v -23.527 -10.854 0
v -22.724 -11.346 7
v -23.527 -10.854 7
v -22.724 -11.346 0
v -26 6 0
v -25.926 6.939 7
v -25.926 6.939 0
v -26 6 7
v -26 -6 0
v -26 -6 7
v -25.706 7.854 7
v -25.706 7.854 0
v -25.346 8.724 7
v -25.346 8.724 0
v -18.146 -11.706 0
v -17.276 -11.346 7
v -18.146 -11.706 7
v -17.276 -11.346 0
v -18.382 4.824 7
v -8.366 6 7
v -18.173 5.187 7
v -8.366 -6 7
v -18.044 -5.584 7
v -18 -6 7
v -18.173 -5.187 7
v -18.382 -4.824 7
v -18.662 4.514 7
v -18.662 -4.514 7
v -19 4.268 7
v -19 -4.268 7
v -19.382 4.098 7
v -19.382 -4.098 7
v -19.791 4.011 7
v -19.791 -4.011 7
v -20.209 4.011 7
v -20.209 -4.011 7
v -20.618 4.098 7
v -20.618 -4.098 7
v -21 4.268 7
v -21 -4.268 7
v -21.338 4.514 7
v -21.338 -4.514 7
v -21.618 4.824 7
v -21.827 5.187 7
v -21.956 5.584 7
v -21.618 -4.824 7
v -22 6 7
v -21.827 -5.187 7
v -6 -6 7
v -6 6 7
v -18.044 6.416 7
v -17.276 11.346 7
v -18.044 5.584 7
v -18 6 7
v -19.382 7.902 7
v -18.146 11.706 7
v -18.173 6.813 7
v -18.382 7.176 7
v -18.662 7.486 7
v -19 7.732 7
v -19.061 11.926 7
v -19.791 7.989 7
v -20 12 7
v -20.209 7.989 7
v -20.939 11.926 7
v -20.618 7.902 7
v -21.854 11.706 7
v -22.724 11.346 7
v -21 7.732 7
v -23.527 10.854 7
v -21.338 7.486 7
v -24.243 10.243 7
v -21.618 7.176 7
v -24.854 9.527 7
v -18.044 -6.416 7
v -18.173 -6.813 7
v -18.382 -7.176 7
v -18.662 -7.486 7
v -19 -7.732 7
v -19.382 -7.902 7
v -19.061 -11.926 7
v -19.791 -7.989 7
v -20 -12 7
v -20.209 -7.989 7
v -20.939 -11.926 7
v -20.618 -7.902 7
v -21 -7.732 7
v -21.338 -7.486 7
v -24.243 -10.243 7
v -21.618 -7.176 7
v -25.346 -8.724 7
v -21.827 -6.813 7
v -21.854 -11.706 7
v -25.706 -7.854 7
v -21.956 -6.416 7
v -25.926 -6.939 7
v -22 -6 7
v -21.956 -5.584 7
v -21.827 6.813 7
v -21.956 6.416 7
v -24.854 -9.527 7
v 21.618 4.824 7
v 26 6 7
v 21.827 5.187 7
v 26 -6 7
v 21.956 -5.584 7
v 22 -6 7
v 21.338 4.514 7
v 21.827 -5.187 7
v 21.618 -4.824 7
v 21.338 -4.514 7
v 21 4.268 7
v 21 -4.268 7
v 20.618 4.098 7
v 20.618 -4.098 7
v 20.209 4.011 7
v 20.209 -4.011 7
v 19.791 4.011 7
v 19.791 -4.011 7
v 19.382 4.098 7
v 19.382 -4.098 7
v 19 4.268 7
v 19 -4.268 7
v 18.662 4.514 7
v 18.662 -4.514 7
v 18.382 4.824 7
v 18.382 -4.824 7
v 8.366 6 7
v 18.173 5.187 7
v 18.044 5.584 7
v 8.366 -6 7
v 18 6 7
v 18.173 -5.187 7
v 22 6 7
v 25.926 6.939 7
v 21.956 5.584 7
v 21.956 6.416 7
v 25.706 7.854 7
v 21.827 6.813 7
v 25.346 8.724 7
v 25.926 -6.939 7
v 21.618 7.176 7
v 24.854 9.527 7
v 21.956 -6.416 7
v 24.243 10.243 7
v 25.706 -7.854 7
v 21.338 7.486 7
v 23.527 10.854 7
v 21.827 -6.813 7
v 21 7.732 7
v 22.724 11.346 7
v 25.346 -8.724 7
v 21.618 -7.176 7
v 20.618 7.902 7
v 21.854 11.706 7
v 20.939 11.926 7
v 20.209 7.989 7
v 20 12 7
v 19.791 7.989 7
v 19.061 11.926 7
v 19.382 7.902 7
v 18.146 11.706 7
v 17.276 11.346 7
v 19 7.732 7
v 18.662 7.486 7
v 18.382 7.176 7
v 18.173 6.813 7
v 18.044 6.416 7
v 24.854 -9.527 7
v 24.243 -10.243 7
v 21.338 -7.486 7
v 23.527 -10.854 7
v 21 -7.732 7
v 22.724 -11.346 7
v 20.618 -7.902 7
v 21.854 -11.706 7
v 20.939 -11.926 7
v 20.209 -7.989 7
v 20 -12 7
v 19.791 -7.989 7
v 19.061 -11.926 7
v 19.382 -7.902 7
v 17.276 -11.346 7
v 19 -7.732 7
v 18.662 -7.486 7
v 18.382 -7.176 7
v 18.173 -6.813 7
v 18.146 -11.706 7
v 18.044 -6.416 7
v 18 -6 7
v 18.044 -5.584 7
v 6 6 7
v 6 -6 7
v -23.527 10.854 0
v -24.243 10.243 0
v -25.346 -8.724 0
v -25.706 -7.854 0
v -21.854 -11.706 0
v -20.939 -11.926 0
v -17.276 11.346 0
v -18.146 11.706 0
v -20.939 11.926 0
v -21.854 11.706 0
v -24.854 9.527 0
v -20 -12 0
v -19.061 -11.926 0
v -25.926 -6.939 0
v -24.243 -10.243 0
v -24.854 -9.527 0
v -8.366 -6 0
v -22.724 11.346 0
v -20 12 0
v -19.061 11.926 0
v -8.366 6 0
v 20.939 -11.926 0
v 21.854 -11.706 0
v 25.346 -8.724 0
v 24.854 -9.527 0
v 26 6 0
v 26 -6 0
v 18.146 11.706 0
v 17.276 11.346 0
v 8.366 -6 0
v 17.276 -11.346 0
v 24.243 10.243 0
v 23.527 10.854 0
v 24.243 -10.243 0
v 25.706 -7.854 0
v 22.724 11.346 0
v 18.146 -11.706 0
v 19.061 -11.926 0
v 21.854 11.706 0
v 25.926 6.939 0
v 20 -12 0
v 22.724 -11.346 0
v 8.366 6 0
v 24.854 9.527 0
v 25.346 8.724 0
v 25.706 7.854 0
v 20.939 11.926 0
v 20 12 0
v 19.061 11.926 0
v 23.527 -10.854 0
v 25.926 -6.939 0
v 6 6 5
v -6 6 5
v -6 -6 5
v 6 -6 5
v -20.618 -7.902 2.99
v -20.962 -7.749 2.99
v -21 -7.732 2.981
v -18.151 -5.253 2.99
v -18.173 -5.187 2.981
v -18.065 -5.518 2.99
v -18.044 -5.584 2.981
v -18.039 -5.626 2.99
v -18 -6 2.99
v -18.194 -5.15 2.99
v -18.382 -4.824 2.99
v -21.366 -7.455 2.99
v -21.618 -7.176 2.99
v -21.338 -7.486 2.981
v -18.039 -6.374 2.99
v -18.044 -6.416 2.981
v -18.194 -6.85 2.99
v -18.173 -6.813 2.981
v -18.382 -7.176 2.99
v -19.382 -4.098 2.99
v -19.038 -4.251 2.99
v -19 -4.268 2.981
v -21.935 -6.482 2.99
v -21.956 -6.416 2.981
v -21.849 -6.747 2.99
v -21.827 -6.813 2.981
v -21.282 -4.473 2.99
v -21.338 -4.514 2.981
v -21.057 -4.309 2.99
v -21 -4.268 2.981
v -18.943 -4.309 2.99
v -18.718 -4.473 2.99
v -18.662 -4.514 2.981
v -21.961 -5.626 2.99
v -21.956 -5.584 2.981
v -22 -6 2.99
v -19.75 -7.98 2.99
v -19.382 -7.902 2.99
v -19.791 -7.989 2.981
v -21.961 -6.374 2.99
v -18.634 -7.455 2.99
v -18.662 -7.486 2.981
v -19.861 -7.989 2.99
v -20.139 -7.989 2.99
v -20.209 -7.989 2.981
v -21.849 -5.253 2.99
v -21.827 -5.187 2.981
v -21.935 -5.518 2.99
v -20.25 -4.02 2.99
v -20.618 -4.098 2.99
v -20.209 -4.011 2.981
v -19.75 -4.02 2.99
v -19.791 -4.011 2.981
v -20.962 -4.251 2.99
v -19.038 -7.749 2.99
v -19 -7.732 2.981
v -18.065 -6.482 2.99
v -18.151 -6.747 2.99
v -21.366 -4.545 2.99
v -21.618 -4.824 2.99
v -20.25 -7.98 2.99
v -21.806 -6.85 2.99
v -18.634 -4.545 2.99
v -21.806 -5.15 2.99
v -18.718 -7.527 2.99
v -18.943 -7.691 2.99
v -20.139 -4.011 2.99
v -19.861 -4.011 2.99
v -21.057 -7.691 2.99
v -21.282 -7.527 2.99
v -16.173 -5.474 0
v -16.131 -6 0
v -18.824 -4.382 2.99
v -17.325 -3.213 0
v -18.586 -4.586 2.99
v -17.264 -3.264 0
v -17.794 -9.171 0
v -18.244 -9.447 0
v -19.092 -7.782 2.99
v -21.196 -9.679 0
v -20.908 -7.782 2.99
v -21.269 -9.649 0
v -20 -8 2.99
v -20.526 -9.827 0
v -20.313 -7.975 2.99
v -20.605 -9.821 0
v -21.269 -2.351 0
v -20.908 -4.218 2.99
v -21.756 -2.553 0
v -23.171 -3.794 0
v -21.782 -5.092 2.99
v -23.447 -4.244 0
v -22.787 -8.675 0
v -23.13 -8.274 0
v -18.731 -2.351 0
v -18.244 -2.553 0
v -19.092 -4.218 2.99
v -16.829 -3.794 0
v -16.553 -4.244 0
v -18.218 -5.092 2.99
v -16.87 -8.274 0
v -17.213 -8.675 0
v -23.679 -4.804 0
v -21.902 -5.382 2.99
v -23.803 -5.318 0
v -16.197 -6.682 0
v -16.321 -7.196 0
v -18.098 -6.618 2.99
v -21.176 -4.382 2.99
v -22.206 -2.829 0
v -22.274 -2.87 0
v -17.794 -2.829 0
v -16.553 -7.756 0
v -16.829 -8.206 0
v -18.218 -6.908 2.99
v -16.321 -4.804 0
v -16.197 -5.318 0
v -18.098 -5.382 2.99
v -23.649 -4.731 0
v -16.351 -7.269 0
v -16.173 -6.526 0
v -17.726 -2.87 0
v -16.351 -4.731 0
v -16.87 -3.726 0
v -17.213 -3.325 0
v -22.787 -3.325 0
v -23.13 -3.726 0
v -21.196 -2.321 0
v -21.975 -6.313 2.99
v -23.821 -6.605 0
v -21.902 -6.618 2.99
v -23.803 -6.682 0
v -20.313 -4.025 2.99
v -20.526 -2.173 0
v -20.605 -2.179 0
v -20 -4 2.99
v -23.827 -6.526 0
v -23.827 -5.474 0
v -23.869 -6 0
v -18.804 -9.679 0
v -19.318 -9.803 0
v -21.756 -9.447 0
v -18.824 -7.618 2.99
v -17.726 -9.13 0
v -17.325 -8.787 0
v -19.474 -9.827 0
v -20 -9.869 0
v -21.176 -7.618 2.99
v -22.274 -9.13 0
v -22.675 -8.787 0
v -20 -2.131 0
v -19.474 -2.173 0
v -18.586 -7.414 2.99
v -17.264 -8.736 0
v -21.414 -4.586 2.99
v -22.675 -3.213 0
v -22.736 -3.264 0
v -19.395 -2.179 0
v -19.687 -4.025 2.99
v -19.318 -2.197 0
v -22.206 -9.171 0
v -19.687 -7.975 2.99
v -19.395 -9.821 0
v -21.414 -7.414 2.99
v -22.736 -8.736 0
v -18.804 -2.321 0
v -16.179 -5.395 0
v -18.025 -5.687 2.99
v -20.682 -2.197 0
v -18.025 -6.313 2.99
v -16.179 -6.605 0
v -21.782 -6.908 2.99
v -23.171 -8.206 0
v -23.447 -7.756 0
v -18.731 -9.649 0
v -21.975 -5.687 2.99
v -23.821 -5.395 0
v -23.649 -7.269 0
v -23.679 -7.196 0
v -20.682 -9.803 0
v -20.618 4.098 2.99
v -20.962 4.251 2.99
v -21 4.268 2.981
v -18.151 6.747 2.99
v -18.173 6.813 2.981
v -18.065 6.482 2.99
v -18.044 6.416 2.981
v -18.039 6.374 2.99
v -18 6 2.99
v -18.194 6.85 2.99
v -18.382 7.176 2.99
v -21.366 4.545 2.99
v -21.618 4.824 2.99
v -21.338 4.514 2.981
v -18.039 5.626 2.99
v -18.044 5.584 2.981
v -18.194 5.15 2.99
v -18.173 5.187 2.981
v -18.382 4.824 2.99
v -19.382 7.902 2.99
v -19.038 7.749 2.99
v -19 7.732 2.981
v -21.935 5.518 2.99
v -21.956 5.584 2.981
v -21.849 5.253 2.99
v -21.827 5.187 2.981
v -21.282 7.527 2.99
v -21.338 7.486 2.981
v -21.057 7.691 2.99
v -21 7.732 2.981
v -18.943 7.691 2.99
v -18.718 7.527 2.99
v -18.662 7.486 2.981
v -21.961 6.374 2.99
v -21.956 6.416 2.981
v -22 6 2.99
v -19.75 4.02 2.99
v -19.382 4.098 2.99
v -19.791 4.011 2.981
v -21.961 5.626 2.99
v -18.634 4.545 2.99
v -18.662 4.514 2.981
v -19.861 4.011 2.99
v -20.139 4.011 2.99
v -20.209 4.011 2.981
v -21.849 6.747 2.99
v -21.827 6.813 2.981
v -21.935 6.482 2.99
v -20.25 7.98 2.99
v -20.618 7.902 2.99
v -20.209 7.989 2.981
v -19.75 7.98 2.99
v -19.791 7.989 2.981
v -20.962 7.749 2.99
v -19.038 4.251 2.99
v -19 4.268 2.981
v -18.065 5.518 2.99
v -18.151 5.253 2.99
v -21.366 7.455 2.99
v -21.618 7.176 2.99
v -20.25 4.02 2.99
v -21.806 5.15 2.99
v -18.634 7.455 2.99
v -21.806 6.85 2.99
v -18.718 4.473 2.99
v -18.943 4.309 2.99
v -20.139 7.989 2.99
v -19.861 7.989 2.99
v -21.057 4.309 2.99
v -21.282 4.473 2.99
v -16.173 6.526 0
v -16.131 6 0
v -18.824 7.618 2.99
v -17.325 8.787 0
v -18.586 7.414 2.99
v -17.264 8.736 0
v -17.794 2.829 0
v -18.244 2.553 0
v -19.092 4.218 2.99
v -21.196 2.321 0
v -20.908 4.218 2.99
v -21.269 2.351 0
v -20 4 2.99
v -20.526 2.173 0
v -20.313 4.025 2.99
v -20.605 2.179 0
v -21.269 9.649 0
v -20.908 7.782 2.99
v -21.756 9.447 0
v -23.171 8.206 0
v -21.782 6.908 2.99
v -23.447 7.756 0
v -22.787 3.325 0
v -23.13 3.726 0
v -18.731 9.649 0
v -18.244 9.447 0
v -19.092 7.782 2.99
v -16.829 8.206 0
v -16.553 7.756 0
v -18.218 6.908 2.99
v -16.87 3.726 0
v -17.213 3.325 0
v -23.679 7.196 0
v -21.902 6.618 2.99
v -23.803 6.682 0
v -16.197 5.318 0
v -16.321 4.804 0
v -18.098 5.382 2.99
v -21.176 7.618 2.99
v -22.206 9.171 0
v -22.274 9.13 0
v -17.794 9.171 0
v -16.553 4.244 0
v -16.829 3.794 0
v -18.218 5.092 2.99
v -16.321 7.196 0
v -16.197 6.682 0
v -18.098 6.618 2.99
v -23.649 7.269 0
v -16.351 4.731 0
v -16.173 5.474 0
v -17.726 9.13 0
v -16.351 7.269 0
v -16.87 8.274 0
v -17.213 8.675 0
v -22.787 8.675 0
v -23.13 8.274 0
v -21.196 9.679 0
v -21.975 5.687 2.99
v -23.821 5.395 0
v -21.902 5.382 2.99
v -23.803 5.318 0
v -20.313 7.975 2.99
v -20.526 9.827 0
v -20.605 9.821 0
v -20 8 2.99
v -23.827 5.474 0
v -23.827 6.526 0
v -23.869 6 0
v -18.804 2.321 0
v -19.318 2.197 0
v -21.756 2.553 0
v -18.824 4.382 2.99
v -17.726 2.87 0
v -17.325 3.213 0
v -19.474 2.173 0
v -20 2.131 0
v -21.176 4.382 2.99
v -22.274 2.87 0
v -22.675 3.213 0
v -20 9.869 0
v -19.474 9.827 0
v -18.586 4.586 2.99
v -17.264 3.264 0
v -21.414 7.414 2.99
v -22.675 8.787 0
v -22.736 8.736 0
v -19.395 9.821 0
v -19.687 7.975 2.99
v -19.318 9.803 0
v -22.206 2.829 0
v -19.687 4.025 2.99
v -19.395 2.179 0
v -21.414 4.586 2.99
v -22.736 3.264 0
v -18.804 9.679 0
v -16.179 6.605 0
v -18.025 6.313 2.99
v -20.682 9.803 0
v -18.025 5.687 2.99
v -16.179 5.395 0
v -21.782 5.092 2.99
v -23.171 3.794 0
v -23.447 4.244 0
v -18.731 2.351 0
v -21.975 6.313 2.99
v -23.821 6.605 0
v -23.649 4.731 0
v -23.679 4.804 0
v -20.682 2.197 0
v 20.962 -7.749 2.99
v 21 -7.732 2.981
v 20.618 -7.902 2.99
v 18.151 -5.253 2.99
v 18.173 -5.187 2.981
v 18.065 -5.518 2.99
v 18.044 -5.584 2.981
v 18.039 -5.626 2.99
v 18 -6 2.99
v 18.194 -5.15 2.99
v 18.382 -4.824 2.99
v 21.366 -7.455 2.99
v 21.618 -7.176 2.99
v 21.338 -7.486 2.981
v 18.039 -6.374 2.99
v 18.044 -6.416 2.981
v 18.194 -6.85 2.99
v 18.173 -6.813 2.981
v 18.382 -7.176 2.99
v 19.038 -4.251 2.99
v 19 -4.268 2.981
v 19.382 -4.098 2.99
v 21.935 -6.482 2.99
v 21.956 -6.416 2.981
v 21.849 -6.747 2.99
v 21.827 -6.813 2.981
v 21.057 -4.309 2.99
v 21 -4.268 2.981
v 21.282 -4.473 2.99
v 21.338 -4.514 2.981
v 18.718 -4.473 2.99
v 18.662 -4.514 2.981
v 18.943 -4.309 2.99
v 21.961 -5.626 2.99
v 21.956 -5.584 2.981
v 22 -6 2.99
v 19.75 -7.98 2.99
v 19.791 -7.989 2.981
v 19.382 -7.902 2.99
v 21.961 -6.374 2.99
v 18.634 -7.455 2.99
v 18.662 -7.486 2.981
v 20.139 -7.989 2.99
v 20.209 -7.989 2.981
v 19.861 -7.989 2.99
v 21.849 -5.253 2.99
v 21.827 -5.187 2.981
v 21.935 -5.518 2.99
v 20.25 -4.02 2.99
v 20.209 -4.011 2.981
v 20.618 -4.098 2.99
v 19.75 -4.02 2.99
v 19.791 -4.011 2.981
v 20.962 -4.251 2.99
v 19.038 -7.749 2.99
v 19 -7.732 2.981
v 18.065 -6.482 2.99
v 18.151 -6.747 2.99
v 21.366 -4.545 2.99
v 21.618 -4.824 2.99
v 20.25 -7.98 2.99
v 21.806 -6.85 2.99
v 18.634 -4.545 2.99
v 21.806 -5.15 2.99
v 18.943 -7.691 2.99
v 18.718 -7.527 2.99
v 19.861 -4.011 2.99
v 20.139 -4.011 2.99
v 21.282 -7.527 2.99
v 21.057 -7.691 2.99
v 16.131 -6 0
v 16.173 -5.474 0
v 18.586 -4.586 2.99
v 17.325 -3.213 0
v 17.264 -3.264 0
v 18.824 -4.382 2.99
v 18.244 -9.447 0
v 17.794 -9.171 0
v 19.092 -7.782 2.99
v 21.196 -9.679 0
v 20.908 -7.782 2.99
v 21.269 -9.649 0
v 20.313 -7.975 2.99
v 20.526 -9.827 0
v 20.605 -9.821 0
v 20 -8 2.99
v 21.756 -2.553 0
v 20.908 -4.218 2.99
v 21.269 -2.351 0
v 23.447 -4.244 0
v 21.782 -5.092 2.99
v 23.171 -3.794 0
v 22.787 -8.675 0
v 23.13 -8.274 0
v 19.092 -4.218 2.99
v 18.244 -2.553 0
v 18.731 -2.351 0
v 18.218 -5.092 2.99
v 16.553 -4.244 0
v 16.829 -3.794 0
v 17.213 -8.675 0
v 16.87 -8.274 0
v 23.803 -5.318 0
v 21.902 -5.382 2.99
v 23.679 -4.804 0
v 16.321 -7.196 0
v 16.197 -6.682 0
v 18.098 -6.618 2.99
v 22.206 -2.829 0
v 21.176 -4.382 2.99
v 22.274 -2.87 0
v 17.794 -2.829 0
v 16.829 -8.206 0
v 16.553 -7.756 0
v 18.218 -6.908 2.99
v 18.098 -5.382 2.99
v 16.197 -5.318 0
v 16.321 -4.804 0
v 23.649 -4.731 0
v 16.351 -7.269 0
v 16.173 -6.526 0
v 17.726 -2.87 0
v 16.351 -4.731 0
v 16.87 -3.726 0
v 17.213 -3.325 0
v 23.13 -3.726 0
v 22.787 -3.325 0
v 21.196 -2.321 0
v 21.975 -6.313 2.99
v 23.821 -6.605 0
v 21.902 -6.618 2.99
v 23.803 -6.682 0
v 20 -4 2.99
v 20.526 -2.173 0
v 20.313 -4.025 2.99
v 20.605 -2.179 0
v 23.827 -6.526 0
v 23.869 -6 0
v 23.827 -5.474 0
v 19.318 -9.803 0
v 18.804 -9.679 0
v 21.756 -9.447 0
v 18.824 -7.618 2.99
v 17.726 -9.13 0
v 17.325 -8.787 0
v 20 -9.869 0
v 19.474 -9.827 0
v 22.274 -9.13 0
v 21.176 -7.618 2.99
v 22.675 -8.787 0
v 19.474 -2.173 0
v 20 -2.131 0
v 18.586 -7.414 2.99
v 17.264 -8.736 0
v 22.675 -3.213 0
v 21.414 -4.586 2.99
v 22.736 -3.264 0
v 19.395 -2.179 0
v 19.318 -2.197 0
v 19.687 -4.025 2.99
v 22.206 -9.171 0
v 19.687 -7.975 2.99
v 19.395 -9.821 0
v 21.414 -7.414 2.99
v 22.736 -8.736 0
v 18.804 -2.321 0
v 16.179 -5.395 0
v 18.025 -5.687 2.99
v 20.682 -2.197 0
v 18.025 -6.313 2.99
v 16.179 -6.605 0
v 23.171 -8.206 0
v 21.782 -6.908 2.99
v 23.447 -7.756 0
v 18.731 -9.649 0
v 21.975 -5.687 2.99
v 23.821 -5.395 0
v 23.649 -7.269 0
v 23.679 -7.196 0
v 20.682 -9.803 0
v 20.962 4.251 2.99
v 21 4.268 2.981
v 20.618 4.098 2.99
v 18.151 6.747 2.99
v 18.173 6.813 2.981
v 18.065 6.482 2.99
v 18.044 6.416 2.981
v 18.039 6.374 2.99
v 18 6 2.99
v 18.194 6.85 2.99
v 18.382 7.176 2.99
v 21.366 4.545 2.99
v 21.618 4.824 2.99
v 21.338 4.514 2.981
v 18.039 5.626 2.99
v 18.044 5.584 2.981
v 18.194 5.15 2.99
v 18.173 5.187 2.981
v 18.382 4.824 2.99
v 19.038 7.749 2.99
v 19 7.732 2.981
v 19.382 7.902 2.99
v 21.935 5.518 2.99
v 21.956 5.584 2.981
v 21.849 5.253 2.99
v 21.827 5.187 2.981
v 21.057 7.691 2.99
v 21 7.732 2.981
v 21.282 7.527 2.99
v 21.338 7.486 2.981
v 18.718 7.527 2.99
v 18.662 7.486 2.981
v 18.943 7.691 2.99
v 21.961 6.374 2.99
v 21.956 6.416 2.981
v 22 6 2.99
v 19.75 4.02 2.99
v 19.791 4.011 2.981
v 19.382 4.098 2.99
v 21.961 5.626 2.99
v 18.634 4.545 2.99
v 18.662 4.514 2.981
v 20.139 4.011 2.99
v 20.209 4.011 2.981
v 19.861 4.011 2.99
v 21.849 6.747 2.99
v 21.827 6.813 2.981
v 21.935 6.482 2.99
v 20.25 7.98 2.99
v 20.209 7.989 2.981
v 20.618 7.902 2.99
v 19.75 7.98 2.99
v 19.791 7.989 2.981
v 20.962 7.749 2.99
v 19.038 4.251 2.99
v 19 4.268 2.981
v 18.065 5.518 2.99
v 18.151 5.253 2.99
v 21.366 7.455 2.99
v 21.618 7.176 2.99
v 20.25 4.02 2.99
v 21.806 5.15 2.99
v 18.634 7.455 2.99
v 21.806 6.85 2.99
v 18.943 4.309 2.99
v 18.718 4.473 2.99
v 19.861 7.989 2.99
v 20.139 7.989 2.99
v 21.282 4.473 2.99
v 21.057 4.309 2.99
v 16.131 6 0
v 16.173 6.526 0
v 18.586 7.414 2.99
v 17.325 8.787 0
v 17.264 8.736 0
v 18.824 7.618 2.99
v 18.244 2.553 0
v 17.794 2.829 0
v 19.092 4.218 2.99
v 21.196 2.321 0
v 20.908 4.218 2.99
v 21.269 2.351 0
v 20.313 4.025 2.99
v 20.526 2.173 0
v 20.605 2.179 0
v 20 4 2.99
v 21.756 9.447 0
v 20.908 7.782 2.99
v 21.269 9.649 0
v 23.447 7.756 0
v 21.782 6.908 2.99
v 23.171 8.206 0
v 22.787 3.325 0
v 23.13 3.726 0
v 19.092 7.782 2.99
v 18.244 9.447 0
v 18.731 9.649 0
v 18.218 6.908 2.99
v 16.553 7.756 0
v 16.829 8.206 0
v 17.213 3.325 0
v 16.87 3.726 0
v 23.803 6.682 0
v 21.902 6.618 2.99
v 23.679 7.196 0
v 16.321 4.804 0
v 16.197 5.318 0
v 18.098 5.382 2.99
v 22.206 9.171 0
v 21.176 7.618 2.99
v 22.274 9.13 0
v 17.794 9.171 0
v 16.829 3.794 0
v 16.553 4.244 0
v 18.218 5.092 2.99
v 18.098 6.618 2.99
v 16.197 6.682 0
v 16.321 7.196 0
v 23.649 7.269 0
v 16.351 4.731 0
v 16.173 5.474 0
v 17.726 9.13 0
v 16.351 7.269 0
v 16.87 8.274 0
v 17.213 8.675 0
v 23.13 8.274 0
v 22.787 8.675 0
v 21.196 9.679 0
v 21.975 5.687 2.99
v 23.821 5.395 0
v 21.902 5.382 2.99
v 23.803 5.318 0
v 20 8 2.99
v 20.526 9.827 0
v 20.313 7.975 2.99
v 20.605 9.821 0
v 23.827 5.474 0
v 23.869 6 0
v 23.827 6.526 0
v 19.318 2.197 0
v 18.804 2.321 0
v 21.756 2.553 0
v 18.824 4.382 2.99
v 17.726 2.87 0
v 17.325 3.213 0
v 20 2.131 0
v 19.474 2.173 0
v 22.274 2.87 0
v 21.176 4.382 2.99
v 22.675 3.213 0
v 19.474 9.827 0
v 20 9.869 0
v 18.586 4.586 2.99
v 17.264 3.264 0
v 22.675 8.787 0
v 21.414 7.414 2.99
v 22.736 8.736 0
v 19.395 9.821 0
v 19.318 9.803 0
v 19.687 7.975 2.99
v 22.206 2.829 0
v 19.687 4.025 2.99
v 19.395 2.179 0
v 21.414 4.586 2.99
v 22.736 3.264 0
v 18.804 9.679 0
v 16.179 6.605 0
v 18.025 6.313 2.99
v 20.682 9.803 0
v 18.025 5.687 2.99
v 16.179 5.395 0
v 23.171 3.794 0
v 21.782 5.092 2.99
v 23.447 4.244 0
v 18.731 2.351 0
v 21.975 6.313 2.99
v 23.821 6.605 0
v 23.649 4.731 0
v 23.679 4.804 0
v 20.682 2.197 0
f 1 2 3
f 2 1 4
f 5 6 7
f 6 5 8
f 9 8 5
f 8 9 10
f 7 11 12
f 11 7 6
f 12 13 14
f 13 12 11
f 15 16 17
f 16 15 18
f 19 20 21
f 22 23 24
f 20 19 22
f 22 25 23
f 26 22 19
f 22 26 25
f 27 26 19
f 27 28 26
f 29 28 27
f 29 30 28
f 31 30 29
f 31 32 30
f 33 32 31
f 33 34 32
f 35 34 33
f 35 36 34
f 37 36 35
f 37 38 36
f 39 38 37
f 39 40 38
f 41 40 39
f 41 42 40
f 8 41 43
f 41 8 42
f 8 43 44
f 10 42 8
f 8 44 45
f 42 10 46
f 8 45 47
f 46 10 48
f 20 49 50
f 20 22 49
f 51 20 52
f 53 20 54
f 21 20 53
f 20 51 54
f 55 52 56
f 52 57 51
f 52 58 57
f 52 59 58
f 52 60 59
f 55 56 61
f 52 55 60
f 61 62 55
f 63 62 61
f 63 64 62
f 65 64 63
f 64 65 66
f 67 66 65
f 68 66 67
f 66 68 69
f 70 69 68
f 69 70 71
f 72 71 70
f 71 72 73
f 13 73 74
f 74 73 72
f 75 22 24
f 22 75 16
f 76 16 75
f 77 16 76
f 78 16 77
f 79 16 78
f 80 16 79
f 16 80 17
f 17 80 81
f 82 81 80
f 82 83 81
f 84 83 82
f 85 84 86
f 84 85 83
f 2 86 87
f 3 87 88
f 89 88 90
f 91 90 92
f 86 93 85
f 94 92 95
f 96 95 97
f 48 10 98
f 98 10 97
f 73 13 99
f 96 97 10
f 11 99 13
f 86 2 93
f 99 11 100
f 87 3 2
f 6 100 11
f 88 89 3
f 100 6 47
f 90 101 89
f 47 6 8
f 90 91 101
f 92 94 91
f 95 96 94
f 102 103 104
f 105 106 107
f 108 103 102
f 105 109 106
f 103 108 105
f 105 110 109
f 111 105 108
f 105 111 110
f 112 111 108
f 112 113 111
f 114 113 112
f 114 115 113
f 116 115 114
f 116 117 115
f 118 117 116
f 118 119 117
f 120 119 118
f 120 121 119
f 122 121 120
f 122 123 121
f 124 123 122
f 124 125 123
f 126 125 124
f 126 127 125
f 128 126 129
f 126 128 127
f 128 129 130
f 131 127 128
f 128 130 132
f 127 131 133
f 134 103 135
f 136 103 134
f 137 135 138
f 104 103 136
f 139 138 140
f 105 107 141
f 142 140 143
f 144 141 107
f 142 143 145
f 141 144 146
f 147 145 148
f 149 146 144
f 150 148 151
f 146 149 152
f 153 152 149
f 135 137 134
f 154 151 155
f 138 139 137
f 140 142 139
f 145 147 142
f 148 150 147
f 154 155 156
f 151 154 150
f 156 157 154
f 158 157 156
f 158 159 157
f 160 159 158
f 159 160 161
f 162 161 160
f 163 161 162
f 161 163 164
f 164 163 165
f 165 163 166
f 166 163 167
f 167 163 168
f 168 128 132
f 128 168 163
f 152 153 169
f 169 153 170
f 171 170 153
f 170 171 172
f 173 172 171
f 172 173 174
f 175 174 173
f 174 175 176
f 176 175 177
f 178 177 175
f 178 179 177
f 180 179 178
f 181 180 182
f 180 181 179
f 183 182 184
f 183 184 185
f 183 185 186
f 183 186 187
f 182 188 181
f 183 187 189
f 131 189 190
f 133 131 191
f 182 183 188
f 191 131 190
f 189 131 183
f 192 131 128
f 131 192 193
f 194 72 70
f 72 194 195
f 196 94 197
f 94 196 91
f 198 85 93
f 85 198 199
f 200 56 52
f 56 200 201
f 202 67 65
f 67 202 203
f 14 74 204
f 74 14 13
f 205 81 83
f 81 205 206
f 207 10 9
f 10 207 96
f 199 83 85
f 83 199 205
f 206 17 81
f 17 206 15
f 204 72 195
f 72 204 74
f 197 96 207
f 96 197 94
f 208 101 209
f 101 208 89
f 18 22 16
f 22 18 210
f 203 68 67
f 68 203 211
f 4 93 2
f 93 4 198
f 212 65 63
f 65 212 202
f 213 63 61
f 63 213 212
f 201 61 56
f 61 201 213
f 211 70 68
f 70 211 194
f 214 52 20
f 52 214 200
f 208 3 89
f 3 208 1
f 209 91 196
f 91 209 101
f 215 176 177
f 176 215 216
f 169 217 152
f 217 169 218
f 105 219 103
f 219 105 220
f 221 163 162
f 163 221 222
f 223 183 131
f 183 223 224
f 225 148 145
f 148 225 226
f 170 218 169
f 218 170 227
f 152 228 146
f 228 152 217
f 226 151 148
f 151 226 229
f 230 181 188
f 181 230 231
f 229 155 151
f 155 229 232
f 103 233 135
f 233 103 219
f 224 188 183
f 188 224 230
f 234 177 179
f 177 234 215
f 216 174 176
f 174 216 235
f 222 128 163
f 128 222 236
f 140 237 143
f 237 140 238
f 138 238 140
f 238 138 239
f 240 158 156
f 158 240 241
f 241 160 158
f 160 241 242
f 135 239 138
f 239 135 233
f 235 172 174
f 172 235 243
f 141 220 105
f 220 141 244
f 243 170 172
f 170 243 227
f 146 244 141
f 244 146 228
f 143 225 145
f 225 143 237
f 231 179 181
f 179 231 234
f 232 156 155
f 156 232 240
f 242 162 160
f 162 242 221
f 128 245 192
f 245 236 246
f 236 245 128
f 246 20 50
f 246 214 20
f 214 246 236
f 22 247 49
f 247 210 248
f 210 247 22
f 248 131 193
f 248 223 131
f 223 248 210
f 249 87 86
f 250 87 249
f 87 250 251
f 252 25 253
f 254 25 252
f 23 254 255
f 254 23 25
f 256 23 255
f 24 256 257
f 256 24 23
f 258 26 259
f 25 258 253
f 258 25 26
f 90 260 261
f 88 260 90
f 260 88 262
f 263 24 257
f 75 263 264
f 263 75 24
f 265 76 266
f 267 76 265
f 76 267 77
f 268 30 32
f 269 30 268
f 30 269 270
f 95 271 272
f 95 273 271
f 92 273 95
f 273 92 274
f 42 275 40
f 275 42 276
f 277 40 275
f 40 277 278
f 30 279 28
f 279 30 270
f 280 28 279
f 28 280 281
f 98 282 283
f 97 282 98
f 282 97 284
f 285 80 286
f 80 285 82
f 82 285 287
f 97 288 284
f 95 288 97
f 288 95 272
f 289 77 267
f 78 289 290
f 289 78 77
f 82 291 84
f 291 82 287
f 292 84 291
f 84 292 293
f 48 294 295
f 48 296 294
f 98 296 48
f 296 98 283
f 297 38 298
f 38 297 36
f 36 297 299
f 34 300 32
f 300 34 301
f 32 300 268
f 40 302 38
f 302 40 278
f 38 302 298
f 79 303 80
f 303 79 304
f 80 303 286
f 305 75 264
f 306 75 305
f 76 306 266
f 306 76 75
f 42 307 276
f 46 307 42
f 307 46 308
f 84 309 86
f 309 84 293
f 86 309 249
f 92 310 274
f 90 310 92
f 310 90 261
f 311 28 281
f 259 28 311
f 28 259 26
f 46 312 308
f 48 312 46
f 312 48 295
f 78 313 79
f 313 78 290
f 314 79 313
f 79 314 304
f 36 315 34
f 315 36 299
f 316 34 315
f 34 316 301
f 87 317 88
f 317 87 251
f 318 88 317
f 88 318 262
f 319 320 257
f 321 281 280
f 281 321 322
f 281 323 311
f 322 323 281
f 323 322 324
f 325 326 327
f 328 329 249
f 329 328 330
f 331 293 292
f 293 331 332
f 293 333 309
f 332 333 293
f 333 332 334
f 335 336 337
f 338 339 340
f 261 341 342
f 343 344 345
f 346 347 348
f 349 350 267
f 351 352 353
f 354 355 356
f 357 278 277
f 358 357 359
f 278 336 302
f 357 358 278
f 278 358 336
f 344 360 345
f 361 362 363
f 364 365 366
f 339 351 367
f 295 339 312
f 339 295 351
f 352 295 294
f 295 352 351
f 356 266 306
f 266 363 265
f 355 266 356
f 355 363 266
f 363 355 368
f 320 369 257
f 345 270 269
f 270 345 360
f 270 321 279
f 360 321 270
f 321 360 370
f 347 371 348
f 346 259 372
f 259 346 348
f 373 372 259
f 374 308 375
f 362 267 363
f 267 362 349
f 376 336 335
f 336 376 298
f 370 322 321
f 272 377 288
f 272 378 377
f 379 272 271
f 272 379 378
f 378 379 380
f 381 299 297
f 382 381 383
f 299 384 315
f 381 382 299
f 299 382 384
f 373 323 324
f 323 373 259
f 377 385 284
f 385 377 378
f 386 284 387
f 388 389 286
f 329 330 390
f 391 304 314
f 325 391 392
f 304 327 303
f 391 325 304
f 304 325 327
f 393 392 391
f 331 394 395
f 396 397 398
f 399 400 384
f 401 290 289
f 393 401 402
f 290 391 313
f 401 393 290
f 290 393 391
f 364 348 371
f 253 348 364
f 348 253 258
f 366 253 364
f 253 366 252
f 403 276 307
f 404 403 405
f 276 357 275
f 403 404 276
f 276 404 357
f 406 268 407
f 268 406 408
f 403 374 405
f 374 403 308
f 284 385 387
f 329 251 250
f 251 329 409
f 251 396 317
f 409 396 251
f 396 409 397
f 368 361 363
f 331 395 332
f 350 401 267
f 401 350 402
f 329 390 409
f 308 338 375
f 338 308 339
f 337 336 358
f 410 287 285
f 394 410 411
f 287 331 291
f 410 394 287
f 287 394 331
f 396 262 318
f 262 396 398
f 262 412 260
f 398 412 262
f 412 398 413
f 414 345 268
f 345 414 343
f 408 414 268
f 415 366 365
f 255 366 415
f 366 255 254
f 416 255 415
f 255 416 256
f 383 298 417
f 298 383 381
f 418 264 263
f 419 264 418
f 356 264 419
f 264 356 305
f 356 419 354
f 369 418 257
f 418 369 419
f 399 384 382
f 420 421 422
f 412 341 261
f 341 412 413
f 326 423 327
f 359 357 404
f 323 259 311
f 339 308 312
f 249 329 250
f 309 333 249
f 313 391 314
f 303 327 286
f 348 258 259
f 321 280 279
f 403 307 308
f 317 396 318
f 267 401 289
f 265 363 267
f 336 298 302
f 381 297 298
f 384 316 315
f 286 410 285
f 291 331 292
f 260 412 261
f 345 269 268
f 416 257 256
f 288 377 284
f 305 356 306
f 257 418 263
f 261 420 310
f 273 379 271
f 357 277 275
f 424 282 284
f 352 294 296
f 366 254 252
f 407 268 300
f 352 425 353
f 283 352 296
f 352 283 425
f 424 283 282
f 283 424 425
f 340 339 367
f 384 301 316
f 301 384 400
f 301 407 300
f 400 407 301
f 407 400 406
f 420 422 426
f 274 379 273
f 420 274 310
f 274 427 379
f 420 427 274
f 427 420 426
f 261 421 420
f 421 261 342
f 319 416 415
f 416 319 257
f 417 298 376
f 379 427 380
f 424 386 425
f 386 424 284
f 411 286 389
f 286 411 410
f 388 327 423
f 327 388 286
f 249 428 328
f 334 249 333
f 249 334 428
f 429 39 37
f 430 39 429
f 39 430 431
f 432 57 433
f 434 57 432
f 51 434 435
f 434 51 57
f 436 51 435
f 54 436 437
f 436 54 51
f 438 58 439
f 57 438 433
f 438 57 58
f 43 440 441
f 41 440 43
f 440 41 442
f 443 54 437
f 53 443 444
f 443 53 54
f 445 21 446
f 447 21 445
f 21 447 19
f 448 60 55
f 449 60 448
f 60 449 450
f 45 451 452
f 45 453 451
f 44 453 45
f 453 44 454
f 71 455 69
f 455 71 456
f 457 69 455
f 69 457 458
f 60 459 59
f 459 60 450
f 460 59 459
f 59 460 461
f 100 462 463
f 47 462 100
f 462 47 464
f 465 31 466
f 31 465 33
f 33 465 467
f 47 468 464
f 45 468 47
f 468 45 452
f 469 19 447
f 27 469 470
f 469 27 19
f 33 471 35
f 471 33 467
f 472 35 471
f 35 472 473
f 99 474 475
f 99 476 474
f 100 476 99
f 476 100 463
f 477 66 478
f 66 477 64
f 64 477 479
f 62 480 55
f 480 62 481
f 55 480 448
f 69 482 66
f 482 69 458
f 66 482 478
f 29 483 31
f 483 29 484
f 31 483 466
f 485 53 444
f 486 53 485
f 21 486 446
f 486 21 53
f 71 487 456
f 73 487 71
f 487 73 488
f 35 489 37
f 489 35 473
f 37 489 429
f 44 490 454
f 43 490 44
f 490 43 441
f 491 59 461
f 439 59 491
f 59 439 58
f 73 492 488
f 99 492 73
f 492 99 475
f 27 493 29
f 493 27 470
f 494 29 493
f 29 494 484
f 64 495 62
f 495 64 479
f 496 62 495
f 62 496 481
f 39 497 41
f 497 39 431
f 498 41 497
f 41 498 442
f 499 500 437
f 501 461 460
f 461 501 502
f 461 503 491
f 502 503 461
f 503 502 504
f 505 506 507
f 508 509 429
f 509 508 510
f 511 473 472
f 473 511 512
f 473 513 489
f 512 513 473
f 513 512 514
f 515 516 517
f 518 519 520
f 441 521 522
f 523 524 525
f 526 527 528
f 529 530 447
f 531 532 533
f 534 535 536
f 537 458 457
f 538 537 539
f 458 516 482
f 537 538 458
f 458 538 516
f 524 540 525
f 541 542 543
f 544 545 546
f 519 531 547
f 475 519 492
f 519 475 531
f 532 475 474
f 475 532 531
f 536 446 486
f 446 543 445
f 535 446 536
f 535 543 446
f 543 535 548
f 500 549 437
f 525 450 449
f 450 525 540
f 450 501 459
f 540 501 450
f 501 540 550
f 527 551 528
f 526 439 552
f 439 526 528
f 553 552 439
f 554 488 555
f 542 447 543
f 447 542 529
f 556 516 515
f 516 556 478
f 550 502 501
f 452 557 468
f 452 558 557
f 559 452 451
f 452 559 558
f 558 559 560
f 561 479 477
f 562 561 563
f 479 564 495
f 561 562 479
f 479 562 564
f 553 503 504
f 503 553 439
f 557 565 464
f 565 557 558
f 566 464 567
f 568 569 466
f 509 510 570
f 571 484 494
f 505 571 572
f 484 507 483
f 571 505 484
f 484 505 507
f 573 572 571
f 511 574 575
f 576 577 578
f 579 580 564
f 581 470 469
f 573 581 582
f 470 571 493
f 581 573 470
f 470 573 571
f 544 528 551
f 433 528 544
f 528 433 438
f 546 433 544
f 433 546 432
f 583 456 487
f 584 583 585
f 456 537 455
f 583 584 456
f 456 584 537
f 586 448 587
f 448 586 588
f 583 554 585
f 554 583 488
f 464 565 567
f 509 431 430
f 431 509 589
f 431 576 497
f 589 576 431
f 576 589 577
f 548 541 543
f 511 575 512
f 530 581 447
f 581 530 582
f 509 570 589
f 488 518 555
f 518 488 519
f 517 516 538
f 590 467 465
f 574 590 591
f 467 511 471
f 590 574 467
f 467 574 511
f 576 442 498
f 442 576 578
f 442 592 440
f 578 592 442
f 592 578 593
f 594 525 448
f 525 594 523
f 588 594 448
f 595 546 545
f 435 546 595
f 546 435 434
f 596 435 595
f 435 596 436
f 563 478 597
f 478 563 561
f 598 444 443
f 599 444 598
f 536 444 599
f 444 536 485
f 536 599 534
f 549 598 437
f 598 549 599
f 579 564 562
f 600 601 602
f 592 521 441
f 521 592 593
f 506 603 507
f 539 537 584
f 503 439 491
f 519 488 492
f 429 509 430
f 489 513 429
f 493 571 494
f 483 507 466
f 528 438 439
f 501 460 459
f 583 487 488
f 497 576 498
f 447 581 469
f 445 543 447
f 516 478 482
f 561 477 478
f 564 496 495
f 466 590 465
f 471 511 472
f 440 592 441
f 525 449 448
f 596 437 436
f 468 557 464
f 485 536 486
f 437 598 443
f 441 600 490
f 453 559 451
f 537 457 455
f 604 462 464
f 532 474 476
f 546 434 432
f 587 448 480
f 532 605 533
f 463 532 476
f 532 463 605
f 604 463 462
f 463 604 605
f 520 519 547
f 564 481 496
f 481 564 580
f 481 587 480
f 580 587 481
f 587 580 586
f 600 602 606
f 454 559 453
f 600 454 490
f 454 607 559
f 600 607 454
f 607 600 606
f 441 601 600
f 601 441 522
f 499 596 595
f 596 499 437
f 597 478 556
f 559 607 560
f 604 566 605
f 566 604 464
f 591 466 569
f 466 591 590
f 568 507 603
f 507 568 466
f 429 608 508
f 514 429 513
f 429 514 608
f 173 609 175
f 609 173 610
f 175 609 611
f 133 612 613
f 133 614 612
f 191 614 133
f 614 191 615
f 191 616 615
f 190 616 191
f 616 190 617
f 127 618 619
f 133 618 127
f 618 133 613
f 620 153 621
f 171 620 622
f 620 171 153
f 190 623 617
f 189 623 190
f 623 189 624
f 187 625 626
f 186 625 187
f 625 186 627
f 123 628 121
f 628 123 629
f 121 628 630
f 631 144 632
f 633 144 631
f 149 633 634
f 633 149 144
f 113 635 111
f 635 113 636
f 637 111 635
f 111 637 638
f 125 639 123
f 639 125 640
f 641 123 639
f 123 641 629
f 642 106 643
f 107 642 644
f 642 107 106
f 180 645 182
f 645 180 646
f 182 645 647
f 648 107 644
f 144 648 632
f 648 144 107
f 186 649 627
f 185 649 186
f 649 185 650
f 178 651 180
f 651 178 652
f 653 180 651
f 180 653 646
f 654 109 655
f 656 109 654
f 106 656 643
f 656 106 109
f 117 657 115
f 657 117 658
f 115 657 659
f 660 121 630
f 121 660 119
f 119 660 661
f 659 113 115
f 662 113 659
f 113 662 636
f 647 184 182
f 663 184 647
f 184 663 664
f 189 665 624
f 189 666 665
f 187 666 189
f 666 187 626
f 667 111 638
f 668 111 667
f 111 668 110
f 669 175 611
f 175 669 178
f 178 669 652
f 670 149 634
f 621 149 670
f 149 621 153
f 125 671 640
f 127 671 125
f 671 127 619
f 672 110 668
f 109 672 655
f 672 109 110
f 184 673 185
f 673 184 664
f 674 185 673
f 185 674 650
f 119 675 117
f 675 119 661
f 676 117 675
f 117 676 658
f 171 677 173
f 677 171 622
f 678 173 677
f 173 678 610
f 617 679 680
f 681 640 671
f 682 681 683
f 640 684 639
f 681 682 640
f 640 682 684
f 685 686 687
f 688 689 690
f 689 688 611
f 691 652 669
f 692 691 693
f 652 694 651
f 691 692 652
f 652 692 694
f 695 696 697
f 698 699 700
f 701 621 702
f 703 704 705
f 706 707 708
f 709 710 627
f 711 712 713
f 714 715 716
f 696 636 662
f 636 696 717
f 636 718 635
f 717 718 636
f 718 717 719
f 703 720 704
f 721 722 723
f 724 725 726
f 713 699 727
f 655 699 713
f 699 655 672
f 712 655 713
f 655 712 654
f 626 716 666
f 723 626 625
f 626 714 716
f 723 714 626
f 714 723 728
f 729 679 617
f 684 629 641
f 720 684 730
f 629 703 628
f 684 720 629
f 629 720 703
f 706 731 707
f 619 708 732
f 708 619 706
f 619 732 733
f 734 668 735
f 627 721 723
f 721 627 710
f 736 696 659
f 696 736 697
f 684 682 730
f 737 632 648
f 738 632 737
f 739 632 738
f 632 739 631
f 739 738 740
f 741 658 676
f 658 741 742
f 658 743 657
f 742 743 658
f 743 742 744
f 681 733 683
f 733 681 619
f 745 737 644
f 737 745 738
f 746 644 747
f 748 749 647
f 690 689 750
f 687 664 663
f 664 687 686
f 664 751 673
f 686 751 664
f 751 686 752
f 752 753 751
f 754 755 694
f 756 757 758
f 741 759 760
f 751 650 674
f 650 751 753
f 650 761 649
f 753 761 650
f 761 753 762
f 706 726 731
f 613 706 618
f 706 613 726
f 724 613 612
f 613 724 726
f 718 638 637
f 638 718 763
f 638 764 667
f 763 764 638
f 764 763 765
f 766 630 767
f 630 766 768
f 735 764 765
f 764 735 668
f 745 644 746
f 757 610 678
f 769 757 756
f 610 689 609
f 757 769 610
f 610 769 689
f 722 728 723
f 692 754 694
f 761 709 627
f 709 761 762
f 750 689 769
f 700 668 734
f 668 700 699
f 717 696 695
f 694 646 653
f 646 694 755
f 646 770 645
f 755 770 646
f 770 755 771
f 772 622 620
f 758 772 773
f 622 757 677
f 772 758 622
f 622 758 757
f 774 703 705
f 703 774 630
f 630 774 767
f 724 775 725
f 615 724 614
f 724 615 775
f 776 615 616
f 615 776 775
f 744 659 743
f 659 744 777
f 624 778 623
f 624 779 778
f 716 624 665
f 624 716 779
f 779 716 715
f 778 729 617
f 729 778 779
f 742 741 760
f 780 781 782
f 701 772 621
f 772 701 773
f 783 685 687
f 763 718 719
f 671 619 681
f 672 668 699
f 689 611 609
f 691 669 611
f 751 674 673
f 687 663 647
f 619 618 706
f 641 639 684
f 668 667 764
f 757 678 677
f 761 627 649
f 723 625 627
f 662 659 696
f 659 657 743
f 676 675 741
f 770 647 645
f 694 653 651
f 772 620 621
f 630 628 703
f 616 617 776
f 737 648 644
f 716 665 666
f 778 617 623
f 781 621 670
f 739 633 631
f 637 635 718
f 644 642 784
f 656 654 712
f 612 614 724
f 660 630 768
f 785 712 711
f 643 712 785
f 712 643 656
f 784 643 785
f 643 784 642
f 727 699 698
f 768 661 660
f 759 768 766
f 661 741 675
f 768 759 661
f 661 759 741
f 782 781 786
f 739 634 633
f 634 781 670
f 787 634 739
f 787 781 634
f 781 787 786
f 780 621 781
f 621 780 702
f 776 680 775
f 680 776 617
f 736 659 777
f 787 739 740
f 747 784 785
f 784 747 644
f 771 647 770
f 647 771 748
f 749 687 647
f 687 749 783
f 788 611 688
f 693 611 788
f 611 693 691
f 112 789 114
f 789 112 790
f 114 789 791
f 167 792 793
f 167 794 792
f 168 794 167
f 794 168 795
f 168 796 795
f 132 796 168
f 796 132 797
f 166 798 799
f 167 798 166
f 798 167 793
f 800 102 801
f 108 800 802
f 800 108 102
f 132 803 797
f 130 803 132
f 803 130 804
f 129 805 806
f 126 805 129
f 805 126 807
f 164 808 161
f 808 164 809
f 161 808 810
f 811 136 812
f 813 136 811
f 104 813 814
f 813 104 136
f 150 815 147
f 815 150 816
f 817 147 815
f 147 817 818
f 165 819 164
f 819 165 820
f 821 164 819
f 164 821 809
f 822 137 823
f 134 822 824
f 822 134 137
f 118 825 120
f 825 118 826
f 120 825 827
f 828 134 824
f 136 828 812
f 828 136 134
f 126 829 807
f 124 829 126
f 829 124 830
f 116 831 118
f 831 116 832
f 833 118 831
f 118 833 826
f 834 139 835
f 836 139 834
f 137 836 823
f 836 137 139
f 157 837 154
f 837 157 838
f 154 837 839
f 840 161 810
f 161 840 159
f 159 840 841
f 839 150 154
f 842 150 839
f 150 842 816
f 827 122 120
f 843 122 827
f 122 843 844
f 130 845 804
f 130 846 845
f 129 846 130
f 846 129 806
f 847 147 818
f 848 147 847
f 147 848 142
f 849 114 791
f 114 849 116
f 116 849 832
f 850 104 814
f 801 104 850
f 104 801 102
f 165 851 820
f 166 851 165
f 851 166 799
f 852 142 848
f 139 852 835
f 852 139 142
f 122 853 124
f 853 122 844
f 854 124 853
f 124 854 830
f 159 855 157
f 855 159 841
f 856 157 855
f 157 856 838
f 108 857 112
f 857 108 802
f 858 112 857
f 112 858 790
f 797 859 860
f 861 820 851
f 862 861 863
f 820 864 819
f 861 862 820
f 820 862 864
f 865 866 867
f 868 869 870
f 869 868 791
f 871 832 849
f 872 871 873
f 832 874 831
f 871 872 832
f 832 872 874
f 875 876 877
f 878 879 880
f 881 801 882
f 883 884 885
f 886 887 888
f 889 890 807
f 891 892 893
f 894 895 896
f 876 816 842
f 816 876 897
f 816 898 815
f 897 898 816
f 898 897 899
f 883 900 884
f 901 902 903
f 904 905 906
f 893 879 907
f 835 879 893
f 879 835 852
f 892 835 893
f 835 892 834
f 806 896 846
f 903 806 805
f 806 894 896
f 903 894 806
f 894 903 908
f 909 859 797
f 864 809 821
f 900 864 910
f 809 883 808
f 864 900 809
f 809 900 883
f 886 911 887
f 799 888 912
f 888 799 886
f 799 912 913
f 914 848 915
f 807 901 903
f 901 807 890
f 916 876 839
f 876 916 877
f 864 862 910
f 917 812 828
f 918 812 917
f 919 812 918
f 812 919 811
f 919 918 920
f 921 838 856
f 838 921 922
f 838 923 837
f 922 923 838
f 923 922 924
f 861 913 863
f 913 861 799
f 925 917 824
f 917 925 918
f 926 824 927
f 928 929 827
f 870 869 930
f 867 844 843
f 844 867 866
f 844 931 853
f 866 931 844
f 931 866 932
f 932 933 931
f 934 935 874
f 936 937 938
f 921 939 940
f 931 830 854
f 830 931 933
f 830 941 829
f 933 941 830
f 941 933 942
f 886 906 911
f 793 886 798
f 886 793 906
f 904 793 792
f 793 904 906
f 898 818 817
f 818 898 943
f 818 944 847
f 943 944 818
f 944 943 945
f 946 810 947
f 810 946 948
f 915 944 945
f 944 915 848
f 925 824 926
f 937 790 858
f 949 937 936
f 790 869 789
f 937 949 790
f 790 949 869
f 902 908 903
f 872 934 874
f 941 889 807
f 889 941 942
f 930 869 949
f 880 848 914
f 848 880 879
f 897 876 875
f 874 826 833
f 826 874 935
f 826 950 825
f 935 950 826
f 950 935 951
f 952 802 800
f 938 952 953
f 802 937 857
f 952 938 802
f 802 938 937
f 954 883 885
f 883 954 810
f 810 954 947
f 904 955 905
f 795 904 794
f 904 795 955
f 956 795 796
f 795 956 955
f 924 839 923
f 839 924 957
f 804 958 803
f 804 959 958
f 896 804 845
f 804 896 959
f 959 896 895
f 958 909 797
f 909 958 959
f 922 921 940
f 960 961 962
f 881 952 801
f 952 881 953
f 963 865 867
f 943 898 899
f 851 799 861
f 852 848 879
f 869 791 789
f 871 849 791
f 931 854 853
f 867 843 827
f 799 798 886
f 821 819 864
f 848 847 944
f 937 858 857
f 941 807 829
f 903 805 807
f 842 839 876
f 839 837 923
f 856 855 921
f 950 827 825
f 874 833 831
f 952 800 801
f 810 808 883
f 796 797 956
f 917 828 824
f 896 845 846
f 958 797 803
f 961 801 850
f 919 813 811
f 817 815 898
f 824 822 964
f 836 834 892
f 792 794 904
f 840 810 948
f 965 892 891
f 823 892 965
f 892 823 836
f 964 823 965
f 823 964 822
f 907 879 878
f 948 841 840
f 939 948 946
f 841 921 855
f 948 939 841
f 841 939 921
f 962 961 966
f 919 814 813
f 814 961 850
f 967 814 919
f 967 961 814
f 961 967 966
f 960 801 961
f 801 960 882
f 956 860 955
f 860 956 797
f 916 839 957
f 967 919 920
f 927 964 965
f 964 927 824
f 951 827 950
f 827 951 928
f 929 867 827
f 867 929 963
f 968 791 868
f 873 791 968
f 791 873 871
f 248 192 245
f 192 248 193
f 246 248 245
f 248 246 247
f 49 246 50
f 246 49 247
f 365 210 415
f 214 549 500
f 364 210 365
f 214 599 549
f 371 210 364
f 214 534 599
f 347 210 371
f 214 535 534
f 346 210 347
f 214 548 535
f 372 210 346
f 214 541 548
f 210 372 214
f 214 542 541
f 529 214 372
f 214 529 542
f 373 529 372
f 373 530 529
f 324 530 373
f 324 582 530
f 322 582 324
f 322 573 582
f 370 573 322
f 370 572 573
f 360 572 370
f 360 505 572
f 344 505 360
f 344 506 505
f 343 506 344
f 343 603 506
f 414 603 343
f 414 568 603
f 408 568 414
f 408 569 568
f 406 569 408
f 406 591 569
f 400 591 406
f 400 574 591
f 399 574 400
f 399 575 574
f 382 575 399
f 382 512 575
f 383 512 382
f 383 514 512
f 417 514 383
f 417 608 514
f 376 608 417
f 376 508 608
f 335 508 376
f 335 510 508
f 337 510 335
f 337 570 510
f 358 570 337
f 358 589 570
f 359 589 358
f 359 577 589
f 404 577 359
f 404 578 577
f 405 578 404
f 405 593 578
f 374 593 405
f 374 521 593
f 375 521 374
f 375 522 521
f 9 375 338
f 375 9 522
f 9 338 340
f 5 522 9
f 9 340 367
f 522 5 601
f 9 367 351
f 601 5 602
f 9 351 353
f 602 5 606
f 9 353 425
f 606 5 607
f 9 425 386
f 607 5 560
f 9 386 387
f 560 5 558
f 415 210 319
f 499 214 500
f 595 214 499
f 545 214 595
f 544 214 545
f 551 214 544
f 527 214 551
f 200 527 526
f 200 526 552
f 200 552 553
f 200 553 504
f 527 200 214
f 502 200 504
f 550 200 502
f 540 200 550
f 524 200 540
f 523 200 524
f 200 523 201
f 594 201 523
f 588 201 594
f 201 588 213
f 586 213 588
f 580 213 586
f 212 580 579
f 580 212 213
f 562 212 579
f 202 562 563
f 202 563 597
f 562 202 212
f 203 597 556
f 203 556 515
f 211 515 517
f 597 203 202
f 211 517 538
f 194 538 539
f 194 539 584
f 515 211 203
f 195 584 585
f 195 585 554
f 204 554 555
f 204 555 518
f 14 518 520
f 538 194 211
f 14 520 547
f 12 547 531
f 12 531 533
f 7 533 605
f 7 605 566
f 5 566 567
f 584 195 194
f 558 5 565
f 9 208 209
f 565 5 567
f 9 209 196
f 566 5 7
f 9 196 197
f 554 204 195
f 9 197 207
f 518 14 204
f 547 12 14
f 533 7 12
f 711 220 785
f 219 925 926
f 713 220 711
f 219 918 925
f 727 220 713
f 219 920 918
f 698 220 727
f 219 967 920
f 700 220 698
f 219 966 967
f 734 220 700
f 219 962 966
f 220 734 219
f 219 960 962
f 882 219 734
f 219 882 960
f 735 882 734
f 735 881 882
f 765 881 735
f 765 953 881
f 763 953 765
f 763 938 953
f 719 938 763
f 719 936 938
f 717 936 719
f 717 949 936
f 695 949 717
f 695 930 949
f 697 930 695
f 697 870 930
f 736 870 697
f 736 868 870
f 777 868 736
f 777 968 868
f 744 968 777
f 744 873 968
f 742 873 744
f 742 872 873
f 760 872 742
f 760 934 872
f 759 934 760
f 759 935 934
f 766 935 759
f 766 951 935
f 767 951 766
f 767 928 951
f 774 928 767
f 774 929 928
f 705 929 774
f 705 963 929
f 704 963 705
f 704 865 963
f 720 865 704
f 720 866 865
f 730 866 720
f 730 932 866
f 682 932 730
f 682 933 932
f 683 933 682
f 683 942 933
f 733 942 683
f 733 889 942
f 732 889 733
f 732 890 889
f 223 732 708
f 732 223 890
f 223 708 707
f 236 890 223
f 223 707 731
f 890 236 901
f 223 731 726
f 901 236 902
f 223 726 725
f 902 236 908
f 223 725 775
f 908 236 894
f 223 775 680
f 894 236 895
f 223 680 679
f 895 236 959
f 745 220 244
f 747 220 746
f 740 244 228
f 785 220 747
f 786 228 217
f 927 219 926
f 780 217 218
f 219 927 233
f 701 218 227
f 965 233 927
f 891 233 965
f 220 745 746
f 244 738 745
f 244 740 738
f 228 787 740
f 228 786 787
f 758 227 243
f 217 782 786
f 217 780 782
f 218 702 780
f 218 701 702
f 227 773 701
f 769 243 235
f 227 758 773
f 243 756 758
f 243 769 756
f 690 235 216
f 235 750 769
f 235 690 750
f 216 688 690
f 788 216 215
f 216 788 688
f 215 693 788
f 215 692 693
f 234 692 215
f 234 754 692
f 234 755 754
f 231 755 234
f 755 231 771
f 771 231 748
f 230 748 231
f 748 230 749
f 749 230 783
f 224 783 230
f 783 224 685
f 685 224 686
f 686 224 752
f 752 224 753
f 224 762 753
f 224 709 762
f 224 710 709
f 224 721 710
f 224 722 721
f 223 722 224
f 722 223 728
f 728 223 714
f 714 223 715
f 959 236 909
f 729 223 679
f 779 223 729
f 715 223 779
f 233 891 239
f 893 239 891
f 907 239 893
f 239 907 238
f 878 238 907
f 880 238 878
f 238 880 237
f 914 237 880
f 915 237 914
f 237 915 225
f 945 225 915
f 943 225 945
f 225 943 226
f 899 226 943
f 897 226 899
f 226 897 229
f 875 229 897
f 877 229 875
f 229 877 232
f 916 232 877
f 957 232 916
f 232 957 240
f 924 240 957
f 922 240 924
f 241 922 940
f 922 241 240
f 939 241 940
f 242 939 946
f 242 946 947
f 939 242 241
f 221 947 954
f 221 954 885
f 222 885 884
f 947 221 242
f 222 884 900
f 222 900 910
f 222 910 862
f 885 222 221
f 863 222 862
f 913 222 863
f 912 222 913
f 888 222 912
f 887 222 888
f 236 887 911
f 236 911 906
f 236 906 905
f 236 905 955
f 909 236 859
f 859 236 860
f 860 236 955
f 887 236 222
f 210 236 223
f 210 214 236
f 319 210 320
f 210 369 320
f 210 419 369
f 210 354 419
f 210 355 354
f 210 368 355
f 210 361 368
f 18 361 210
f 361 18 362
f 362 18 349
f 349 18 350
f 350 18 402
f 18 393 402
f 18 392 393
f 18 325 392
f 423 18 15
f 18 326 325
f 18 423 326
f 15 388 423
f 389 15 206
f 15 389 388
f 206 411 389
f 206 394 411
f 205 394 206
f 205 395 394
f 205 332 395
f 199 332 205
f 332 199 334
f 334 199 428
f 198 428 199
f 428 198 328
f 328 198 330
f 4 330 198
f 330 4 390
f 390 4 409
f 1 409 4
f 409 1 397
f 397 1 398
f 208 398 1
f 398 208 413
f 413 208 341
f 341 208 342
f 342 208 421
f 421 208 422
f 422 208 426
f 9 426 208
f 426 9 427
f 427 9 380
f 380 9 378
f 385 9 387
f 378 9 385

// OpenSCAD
*!reinforce_box();
intersection(){
  translate([-50,-50,0]) cube([100,100,12]);
difference(){
  union(){
    translate([-24,-6,-5]) cube([48,12,12]);
    for(m=[0,1]) mirror([m,0])
    hull(){
      translate([-20,-6,-5]) cylinder(d=12,h=12,$fn=40);
      translate([-20,6,-5]) cylinder(d=12,h=12,$fn=40);
      translate([-10,0,-5]) cylinder(d=12,h=12,$fn=40);
    }
  }
  translate([-6,-6.01,5]) cube([12,12.02,4.02]);
  for(m=[0,1]) mirror([m,0]) {
    *translate([-10,0,-1.01]) screwhole();
    translate([-20,-6,-1.01]) screwhole();
    translate([-20,6,-1.01]) screwhole();
  }
}
}
module screwhole() {
  cylinder(d=4,h=20,$fn=30);
  cylinder(d1=9,d2=4,h=4,$fn=40);
}

module reinforce_box() {
  translate([-10,-10]) cube([20,20,10]);
}
